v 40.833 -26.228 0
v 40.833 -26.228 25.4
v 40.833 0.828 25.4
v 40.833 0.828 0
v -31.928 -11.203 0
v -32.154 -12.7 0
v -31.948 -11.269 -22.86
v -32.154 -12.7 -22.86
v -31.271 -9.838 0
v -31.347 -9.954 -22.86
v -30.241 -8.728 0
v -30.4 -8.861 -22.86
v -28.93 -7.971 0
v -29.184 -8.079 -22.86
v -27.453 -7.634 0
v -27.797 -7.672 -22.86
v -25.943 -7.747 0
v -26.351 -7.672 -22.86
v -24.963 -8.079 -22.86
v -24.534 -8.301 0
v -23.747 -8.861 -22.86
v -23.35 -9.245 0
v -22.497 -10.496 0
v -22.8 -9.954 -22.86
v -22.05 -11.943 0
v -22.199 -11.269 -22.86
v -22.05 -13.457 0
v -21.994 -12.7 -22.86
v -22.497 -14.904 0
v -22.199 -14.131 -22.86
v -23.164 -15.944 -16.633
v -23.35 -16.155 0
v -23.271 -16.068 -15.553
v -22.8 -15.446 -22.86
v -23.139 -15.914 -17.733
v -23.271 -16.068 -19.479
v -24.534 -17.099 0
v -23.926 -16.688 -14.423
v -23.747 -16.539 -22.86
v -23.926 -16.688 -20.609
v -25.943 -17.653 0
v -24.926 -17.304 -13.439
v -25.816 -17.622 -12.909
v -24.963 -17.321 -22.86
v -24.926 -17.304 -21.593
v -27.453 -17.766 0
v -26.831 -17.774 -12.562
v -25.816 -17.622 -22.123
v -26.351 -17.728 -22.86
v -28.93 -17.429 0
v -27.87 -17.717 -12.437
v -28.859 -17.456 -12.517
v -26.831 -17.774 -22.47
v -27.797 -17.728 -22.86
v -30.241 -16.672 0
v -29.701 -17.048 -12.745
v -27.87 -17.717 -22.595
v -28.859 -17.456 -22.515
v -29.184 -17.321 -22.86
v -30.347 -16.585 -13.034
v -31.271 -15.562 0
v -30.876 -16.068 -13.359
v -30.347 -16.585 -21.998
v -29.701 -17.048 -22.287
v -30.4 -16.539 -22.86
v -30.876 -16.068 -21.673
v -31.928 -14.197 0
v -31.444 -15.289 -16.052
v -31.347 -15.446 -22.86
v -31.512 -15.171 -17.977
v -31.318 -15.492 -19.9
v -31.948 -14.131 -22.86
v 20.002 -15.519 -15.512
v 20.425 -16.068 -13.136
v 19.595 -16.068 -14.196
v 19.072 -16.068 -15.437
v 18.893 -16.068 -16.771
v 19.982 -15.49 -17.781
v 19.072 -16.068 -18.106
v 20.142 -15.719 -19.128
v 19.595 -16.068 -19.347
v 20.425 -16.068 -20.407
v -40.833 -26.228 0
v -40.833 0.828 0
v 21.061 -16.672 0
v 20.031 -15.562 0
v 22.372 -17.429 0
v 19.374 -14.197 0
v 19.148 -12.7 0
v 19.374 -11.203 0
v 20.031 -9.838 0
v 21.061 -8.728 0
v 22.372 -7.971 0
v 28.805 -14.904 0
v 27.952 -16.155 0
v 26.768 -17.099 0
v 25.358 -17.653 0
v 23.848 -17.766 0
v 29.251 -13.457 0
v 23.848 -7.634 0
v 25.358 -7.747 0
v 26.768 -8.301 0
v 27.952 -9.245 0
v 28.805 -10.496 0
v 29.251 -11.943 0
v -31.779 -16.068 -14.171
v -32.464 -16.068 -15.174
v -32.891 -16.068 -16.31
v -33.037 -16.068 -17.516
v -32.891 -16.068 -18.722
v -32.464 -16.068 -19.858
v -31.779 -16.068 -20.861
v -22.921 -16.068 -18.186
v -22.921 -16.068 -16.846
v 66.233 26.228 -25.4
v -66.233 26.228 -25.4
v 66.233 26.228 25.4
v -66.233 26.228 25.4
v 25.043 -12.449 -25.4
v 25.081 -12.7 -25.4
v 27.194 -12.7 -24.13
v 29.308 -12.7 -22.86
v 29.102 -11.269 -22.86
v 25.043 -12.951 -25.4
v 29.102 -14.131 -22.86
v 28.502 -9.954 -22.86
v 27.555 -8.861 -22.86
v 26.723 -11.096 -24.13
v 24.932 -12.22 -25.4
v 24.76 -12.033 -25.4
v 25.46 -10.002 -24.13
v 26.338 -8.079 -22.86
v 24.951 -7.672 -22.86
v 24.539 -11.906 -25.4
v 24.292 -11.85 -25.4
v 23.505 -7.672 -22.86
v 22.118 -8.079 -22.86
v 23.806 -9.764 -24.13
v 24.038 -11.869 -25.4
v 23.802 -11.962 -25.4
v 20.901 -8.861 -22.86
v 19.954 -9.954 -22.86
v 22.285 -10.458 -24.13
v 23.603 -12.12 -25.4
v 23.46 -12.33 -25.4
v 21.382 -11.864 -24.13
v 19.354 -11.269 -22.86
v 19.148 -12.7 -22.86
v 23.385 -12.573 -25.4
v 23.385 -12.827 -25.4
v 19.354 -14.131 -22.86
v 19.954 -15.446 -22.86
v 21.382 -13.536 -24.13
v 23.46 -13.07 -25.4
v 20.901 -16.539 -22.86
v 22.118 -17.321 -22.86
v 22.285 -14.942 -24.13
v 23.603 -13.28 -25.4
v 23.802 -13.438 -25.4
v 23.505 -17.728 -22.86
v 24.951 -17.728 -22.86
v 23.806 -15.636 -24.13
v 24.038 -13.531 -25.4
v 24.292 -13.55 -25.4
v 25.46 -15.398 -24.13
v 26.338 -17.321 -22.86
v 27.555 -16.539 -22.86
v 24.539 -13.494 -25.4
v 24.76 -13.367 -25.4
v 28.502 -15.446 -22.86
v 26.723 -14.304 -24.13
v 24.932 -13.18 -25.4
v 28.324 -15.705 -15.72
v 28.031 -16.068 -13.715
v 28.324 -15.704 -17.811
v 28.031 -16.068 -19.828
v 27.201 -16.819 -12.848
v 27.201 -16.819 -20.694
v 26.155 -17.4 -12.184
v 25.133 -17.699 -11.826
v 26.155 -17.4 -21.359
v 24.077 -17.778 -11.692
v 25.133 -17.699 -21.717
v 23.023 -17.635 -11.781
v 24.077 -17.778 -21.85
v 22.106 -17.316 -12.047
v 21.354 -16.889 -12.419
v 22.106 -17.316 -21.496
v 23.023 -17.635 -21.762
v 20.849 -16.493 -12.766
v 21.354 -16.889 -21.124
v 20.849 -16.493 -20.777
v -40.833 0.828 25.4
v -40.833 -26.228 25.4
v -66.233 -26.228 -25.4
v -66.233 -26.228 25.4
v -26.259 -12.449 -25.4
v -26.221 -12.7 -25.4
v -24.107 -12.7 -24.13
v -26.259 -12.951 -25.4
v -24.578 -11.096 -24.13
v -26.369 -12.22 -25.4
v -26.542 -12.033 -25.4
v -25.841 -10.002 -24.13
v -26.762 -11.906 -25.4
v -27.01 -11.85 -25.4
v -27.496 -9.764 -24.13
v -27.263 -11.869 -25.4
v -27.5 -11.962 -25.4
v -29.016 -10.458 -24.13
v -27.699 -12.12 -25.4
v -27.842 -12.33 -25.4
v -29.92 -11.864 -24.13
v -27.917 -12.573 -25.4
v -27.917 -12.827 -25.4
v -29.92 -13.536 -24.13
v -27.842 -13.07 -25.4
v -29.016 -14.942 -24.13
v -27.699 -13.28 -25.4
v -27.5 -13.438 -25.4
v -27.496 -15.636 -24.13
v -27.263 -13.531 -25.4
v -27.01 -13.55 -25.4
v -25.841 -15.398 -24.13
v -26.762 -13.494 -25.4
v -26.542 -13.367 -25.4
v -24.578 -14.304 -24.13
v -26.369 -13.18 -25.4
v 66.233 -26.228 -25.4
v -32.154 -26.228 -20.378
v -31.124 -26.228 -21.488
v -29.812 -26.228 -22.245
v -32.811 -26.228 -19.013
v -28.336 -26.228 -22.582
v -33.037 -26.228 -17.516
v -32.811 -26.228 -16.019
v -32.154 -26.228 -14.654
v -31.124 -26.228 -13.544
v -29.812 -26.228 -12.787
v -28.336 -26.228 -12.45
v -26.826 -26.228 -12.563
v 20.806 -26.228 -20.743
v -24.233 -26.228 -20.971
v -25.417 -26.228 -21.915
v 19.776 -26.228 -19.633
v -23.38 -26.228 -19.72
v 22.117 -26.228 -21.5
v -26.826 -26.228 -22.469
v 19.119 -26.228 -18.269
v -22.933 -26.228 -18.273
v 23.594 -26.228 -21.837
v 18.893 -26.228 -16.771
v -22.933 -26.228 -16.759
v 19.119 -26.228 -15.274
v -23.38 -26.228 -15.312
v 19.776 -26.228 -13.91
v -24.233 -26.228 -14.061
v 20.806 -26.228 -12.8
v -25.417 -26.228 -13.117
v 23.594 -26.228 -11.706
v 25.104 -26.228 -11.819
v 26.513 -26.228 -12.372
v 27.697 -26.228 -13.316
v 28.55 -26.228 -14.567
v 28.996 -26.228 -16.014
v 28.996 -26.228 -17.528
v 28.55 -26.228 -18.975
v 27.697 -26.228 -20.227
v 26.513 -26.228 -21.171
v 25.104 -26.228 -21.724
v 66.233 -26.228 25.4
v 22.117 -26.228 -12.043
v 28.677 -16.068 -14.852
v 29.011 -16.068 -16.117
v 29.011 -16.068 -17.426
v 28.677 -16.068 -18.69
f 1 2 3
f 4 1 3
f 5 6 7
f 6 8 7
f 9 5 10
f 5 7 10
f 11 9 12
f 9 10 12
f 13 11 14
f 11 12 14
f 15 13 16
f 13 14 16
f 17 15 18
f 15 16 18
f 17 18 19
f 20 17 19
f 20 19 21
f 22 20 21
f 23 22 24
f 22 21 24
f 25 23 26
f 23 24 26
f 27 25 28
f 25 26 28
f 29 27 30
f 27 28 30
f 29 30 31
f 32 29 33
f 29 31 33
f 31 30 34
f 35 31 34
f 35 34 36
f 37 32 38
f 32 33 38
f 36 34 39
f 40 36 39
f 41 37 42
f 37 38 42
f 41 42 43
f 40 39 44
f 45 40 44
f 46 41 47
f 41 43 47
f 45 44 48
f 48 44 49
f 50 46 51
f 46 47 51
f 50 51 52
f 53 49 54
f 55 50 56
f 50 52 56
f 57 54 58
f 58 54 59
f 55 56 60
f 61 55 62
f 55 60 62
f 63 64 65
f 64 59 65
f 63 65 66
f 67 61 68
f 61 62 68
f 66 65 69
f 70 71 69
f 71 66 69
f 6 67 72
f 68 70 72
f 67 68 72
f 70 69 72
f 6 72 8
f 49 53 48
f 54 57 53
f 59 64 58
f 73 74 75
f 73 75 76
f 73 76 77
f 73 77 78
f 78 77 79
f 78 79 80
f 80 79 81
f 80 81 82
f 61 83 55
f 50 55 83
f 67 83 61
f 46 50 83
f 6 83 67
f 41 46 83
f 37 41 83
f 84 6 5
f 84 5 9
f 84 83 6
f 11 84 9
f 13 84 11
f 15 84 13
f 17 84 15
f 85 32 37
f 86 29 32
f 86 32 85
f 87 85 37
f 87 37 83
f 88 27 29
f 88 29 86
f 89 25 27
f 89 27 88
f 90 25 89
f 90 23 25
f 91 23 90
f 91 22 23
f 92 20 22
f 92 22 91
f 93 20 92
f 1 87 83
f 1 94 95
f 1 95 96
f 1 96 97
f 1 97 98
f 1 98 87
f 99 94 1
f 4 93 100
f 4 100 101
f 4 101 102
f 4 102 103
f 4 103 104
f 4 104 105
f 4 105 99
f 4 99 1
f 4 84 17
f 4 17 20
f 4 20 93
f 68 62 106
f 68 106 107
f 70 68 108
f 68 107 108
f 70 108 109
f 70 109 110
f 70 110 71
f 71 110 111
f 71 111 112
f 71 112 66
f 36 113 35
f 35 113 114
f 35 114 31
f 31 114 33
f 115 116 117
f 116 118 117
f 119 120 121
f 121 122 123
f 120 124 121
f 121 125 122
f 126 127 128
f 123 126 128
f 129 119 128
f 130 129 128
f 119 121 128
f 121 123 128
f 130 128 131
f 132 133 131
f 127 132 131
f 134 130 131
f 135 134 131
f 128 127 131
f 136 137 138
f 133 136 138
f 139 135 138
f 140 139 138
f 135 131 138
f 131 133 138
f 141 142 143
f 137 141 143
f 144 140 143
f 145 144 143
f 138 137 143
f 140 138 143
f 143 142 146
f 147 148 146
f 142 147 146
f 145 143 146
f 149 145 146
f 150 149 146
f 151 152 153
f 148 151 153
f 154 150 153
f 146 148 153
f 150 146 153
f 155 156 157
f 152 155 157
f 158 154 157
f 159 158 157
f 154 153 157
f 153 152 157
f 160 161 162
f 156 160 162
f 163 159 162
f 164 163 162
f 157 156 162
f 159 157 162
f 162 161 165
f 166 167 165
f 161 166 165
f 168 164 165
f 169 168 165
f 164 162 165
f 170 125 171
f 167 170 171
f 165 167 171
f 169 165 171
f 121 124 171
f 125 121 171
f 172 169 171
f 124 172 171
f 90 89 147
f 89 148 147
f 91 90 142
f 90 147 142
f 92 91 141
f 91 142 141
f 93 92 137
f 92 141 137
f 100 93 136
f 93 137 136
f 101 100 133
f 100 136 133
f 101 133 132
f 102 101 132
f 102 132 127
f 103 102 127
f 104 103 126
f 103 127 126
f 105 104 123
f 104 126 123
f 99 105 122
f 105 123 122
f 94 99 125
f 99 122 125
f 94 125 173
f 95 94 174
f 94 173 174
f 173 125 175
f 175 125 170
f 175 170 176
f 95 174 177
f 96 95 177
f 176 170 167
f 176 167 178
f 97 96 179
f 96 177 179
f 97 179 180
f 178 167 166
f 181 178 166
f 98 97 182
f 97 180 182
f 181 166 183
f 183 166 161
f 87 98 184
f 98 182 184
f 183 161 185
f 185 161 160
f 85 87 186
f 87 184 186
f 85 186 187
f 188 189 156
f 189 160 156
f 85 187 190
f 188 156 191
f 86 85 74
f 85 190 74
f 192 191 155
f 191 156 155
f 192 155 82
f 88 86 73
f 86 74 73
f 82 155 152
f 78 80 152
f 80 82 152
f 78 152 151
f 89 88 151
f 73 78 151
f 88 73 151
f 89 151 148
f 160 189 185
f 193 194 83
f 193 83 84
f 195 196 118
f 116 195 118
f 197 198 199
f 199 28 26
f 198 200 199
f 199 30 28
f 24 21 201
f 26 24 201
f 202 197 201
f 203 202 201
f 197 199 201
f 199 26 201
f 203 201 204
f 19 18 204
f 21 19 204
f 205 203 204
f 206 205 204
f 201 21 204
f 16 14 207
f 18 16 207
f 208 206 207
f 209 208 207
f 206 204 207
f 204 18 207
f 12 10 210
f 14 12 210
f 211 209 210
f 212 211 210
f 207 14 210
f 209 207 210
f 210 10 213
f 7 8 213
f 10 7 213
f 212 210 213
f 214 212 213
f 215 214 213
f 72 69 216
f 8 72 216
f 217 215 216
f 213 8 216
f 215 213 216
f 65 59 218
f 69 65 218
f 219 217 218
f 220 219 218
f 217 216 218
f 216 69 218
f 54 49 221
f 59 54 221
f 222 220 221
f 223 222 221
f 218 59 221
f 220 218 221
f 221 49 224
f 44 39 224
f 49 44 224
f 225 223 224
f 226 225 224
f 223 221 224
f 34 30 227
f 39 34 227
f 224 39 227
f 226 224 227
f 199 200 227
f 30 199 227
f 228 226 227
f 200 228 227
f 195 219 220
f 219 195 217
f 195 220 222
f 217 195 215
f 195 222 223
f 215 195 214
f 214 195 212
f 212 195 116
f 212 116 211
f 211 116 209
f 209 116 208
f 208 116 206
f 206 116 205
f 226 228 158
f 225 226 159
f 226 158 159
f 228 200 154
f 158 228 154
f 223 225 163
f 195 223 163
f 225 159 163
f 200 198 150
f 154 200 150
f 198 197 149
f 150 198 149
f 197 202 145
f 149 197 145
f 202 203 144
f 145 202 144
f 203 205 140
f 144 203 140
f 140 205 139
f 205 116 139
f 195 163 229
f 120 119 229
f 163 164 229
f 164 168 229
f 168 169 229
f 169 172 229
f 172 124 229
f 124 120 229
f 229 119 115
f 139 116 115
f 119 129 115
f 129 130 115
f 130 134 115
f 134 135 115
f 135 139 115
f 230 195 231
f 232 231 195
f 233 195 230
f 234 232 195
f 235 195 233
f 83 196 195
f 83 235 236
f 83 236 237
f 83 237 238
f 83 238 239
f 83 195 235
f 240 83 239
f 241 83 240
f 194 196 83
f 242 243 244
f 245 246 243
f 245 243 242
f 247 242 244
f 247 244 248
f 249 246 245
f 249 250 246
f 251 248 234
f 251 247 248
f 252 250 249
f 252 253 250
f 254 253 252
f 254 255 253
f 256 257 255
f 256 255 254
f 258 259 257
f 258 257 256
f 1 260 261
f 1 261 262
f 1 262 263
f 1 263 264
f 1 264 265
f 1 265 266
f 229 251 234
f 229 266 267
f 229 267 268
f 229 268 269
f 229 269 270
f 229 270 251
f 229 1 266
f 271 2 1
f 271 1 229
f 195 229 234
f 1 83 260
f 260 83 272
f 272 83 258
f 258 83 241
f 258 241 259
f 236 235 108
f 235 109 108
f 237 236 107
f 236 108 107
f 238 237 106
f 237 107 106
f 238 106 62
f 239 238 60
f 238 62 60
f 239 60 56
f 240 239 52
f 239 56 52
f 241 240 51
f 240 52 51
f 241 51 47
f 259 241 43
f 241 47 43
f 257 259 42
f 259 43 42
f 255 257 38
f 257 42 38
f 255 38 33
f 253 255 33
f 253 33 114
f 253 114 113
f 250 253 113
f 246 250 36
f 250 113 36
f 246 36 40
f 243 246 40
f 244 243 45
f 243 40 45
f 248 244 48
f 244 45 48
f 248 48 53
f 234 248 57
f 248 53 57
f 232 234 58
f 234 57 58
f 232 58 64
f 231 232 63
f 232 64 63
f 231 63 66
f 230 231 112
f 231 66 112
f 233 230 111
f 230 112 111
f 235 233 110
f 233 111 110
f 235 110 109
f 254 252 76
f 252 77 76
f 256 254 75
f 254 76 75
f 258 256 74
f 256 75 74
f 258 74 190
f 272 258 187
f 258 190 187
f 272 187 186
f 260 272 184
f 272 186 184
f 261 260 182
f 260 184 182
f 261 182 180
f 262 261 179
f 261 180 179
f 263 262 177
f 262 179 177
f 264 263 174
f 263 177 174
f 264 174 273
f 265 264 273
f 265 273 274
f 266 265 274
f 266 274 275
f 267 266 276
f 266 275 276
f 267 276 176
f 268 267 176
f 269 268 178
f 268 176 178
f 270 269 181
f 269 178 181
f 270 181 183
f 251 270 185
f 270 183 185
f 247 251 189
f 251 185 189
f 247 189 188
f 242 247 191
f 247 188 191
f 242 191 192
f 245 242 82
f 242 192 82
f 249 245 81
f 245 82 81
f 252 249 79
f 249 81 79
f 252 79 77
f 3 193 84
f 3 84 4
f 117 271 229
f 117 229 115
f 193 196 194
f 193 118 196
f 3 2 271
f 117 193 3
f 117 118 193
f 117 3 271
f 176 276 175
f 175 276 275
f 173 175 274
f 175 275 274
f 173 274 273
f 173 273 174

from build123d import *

# Parameters (mm, degrees)
F0_W     = 132.4668824673
F0_H     = 52.4568893015
F1_DEPTH = 25.4
F2_DEPTH = 25.4
F3_T     = -25.4
F5_D     = 10.16
F5_DEPTH = 22.86
F5_TIP   = 3.0523719447
F7_D     = 10.16
F7_DEPTH = 10.16
F7_TIP   = 3.0523719447


with BuildPart() as f1:
    # F0 (on Top) → F1 (new body)
    with BuildSketch(Plane.XY):
        Rectangle(F0_W, F0_H)
    extrude(amount=F1_DEPTH)

    # F2 (add): a face of the model
    f2_faces = [f1.faces().sort_by_distance(p)[0] for p in [
        (0, 0, 0),
    ]]
    extrude(f2_faces, amount=F2_DEPTH)

    # F3
    f3_openings = [f1.faces().sort_by_distance(p)[0] for p in [
        (0, 0, 25.4),
        (0, -26.228445, 0),
    ]]
    offset(amount=F3_T, openings=f3_openings)

    # F5
    with Locations(Plane.XY):
        with Locations((24.2279376835, -12.7), (-27.0736590028, -12.7)):
            Hole(F5_D / 2, depth=F5_DEPTH)
            with Locations((0, 0, -(F5_DEPTH + F5_TIP / 2))):  # 118° drill point
                Cone(0, F5_D / 2, F5_TIP, mode=Mode.SUBTRACT)

    # F7
    with Locations(Plane.XZ.offset(26.2284446508)):
        with Locations((-27.9565155506, -17.5159424543), (23.9731557667, -16.771344468)):
            Hole(F7_D / 2, depth=F7_DEPTH)
            with Locations((0, 0, -(F7_DEPTH + F7_TIP / 2))):  # 118° drill point
                Cone(0, F7_D / 2, F7_TIP, mode=Mode.SUBTRACT)


solid = f1.part
